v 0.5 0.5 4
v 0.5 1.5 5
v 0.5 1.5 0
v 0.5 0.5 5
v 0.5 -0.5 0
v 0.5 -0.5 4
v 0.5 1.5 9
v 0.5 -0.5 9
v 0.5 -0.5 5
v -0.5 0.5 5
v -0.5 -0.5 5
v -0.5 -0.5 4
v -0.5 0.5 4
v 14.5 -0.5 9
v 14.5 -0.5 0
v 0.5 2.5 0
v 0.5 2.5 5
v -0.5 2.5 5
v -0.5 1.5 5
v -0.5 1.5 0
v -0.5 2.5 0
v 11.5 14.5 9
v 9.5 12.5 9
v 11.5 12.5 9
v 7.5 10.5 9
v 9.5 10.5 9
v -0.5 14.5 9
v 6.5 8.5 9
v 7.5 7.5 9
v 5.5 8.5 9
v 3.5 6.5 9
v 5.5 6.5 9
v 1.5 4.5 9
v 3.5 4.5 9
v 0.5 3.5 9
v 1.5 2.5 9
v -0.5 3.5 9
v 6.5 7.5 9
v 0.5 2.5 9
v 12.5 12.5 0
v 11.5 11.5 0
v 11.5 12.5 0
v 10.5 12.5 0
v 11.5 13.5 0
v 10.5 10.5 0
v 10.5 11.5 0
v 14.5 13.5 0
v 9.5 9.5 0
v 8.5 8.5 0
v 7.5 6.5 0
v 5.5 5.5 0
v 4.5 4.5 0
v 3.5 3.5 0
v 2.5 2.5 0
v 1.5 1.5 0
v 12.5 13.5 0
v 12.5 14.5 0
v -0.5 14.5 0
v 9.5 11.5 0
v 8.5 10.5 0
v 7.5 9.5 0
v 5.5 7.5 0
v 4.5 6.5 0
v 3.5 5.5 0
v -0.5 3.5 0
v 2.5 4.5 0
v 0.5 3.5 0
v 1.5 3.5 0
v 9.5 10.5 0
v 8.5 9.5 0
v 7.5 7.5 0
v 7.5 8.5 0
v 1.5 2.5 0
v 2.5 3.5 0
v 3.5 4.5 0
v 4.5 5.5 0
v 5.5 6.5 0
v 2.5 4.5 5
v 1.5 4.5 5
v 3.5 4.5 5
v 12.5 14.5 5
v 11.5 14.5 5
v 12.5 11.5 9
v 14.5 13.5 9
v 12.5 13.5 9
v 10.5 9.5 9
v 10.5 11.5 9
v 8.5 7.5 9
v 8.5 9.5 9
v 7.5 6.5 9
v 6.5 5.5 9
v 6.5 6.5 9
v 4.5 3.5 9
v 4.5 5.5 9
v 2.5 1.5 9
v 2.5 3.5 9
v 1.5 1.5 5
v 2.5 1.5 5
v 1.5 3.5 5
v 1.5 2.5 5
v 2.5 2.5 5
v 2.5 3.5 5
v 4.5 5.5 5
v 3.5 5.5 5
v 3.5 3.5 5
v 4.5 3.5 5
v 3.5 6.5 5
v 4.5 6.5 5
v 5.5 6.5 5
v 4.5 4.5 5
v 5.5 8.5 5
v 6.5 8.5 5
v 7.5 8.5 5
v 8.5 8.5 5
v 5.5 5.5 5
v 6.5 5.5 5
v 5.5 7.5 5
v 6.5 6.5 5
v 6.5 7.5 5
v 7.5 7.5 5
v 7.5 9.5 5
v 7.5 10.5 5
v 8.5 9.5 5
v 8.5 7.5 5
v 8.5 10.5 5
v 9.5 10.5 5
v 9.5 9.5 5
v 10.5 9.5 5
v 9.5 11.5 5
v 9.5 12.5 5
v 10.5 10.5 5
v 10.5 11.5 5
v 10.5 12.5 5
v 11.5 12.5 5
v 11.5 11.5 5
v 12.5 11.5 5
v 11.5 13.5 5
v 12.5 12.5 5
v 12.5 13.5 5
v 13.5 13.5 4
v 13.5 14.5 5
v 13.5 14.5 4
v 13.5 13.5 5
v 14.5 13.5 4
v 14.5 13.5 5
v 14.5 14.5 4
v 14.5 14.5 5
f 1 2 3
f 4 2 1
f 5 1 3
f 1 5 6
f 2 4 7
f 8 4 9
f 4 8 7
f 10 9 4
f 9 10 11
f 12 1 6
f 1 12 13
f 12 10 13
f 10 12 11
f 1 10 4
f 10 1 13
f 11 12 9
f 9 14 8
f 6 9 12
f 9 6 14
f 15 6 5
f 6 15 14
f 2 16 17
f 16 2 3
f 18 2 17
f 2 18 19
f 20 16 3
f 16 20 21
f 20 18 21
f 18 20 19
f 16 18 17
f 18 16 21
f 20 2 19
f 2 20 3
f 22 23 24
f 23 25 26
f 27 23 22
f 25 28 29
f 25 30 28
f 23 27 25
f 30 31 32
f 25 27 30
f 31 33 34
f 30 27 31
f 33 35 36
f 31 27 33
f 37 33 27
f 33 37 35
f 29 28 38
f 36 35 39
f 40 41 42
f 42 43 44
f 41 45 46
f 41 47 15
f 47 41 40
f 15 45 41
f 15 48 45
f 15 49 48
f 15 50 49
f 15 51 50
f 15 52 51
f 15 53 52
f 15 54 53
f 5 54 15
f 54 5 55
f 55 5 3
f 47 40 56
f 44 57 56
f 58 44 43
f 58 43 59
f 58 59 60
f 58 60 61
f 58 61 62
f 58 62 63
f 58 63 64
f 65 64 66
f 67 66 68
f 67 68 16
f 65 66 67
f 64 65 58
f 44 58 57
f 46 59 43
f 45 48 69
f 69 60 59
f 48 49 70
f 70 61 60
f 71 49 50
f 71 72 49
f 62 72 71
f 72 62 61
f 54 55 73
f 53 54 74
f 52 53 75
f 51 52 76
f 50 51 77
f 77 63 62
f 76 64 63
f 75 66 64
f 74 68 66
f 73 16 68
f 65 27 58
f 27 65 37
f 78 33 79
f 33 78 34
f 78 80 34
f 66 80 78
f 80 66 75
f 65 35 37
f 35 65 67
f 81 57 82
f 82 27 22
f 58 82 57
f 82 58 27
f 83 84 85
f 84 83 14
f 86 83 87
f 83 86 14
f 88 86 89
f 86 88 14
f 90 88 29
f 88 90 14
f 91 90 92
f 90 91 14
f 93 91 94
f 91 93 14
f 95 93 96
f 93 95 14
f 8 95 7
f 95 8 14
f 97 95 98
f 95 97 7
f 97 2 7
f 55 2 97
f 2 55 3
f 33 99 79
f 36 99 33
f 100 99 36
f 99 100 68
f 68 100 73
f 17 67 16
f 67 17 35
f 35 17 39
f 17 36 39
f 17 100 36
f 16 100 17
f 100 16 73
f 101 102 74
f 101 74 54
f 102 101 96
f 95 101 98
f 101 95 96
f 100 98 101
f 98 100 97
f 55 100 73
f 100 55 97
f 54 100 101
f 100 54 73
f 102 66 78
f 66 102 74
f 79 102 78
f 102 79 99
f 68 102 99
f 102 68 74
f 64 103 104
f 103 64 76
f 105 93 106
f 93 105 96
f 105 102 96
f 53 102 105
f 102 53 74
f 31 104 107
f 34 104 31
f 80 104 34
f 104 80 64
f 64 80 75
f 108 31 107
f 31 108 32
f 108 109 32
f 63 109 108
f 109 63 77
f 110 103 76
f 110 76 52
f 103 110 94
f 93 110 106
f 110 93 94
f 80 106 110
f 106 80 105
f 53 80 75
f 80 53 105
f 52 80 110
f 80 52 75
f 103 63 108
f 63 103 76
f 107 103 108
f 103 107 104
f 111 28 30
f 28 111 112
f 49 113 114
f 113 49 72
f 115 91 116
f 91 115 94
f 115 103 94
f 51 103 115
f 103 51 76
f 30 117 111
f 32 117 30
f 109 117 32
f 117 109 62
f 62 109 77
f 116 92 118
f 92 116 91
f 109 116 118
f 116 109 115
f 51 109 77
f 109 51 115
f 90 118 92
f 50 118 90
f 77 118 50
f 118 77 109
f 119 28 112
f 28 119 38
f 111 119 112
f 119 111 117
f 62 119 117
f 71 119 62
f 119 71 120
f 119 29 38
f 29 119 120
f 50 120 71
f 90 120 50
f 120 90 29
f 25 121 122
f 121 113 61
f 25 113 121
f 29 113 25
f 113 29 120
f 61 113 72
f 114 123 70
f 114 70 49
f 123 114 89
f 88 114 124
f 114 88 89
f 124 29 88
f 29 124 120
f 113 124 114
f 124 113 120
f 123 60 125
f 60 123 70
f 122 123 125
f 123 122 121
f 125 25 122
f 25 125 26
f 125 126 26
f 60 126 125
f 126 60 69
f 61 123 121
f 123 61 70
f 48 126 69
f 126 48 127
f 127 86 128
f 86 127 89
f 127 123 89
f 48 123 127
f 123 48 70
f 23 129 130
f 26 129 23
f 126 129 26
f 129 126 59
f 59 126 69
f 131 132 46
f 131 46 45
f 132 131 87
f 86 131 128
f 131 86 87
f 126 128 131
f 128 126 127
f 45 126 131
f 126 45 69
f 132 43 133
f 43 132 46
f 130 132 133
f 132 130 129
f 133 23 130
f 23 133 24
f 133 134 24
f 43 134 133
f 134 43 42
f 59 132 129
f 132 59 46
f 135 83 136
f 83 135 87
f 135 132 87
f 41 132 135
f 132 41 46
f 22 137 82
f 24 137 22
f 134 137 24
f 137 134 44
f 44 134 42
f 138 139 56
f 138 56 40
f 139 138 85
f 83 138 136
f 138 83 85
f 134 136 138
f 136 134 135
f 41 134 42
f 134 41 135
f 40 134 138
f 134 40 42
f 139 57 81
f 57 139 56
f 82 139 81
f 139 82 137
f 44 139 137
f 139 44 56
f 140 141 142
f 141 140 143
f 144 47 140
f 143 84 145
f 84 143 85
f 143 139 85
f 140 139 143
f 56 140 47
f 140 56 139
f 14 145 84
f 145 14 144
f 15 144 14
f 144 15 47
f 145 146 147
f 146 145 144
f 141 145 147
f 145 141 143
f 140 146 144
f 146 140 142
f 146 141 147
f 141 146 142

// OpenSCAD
union() {
    translate([0, 0, 4.5]) color([1, 0, 0]) cube([1, 1, 1], center=true);
    translate([0, 2, 2.5]) cube([1, 1, 5], center=true);
    translate([0, 4, 4.5]) cube([1, 1, 9], center=true);
    translate([0, 5, 4.5]) cube([1, 1, 9], center=true);
    translate([0, 6, 4.5]) cube([1, 1, 9], center=true);
    translate([0, 7, 4.5]) cube([1, 1, 9], center=true);
    translate([0, 8, 4.5]) cube([1, 1, 9], center=true);
    translate([0, 9, 4.5]) cube([1, 1, 9], center=true);
    translate([0, 10, 4.5]) cube([1, 1, 9], center=true);
    translate([0, 11, 4.5]) cube([1, 1, 9], center=true);
    translate([0, 12, 4.5]) cube([1, 1, 9], center=true);
    translate([0, 13, 4.5]) cube([1, 1, 9], center=true);
    translate([0, 14, 4.5]) cube([1, 1, 9], center=true);
    translate([1, 0, 4.5]) cube([1, 1, 9], center=true);
    translate([1, 1, 4.5]) cube([1, 1, 9], center=true);
    translate([1, 3, 4.5]) cube([1, 1, 9], center=true);
    translate([1, 4, 4.5]) cube([1, 1, 9], center=true);
    translate([1, 5, 4.5]) cube([1, 1, 9], center=true);
    translate([1, 6, 4.5]) cube([1, 1, 9], center=true);
    translate([1, 7, 4.5]) cube([1, 1, 9], center=true);
    translate([1, 8, 4.5]) cube([1, 1, 9], center=true);
    translate([1, 9, 4.5]) cube([1, 1, 9], center=true);
    translate([1, 10, 4.5]) cube([1, 1, 9], center=true);
    translate([1, 11, 4.5]) cube([1, 1, 9], center=true);
    translate([1, 12, 4.5]) cube([1, 1, 9], center=true);
    translate([1, 13, 4.5]) cube([1, 1, 9], center=true);
    translate([1, 14, 4.5]) cube([1, 1, 9], center=true);
    translate([2, 0, 4.5]) cube([1, 1, 9], center=true);
    translate([2, 1, 4.5]) cube([1, 1, 9], center=true);
    translate([2, 2, 2.5]) cube([1, 1, 5], center=true);
    translate([2, 4, 2.5]) cube([1, 1, 5], center=true);
    translate([2, 5, 4.5]) cube([1, 1, 9], center=true);
    translate([2, 6, 4.5]) cube([1, 1, 9], center=true);
    translate([2, 7, 4.5]) cube([1, 1, 9], center=true);
    translate([2, 8, 4.5]) cube([1, 1, 9], center=true);
    translate([2, 9, 4.5]) cube([1, 1, 9], center=true);
    translate([2, 10, 4.5]) cube([1, 1, 9], center=true);
    translate([2, 11, 4.5]) cube([1, 1, 9], center=true);
    translate([2, 12, 4.5]) cube([1, 1, 9], center=true);
    translate([2, 13, 4.5]) cube([1, 1, 9], center=true);
    translate([2, 14, 4.5]) cube([1, 1, 9], center=true);
    translate([3, 0, 4.5]) cube([1, 1, 9], center=true);
    translate([3, 1, 4.5]) cube([1, 1, 9], center=true);
    translate([3, 2, 4.5]) cube([1, 1, 9], center=true);
    translate([3, 3, 4.5]) cube([1, 1, 9], center=true);
    translate([3, 5, 4.5]) cube([1, 1, 9], center=true);
    translate([3, 6, 4.5]) cube([1, 1, 9], center=true);
    translate([3, 7, 4.5]) cube([1, 1, 9], center=true);
    translate([3, 8, 4.5]) cube([1, 1, 9], center=true);
    translate([3, 9, 4.5]) cube([1, 1, 9], center=true);
    translate([3, 10, 4.5]) cube([1, 1, 9], center=true);
    translate([3, 11, 4.5]) cube([1, 1, 9], center=true);
    translate([3, 12, 4.5]) cube([1, 1, 9], center=true);
    translate([3, 13, 4.5]) cube([1, 1, 9], center=true);
    translate([3, 14, 4.5]) cube([1, 1, 9], center=true);
    translate([4, 0, 4.5]) cube([1, 1, 9], center=true);
    translate([4, 1, 4.5]) cube([1, 1, 9], center=true);
    translate([4, 2, 4.5]) cube([1, 1, 9], center=true);
    translate([4, 3, 4.5]) cube([1, 1, 9], center=true);
    translate([4, 4, 2.5]) cube([1, 1, 5], center=true);
    translate([4, 6, 2.5]) cube([1, 1, 5], center=true);
    translate([4, 7, 4.5]) cube([1, 1, 9], center=true);
    translate([4, 8, 4.5]) cube([1, 1, 9], center=true);
    translate([4, 9, 4.5]) cube([1, 1, 9], center=true);
    translate([4, 10, 4.5]) cube([1, 1, 9], center=true);
    translate([4, 11, 4.5]) cube([1, 1, 9], center=true);
    translate([4, 12, 4.5]) cube([1, 1, 9], center=true);
    translate([4, 13, 4.5]) cube([1, 1, 9], center=true);
    translate([4, 14, 4.5]) cube([1, 1, 9], center=true);
    translate([5, 0, 4.5]) cube([1, 1, 9], center=true);
    translate([5, 1, 4.5]) cube([1, 1, 9], center=true);
    translate([5, 2, 4.5]) cube([1, 1, 9], center=true);
    translate([5, 3, 4.5]) cube([1, 1, 9], center=true);
    translate([5, 4, 4.5]) cube([1, 1, 9], center=true);
    translate([5, 5, 4.5]) cube([1, 1, 9], center=true);
    translate([5, 7, 4.5]) cube([1, 1, 9], center=true);
    translate([5, 8, 4.5]) cube([1, 1, 9], center=true);
    translate([5, 9, 4.5]) cube([1, 1, 9], center=true);
    translate([5, 10, 4.5]) cube([1, 1, 9], center=true);
    translate([5, 11, 4.5]) cube([1, 1, 9], center=true);
    translate([5, 12, 4.5]) cube([1, 1, 9], center=true);
    translate([5, 13, 4.5]) cube([1, 1, 9], center=true);
    translate([5, 14, 4.5]) cube([1, 1, 9], center=true);
    translate([6, 0, 4.5]) cube([1, 1, 9], center=true);
    translate([6, 1, 4.5]) cube([1, 1, 9], center=true);
    translate([6, 2, 4.5]) cube([1, 1, 9], center=true);
    translate([6, 3, 4.5]) cube([1, 1, 9], center=true);
    translate([6, 4, 4.5]) cube([1, 1, 9], center=true);
    translate([6, 5, 4.5]) cube([1, 1, 9], center=true);
    translate([6, 6, 2.5]) cube([1, 1, 5], center=true);
    translate([6, 8, 2.5]) cube([1, 1, 5], center=true);
    translate([6, 9, 4.5]) cube([1, 1, 9], center=true);
    translate([6, 10, 4.5]) cube([1, 1, 9], center=true);
    translate([6, 11, 4.5]) cube([1, 1, 9], center=true);
    translate([6, 12, 4.5]) cube([1, 1, 9], center=true);
    translate([6, 13, 4.5]) cube([1, 1, 9], center=true);
    translate([6, 14, 4.5]) cube([1, 1, 9], center=true);
    translate([7, 0, 4.5]) cube([1, 1, 9], center=true);
    translate([7, 1, 4.5]) cube([1, 1, 9], center=true);
    translate([7, 2, 4.5]) cube([1, 1, 9], center=true);
    translate([7, 3, 4.5]) cube([1, 1, 9], center=true);
    translate([7, 4, 4.5]) cube([1, 1, 9], center=true);
    translate([7, 5, 4.5]) cube([1, 1, 9], center=true);
    translate([7, 6, 4.5]) cube([1, 1, 9], center=true);
    translate([7, 8, 4.5]) cube([1, 1, 9], center=true);
    translate([7, 9, 4.5]) cube([1, 1, 9], center=true);
    translate([7, 10, 4.5]) cube([1, 1, 9], center=true);
    translate([7, 11, 4.5]) cube([1, 1, 9], center=true);
    translate([7, 12, 4.5]) cube([1, 1, 9], center=true);
    translate([7, 13, 4.5]) cube([1, 1, 9], center=true);
    translate([7, 14, 4.5]) cube([1, 1, 9], center=true);
    translate([8, 0, 4.5]) cube([1, 1, 9], center=true);
    translate([8, 1, 4.5]) cube([1, 1, 9], center=true);
    translate([8, 2, 4.5]) cube([1, 1, 9], center=true);
    translate([8, 3, 4.5]) cube([1, 1, 9], center=true);
    translate([8, 4, 4.5]) cube([1, 1, 9], center=true);
    translate([8, 5, 4.5]) cube([1, 1, 9], center=true);
    translate([8, 6, 4.5]) cube([1, 1, 9], center=true);
    translate([8, 7, 4.5]) cube([1, 1, 9], center=true);
    translate([8, 8, 2.5]) cube([1, 1, 5], center=true);
    translate([8, 10, 2.5]) cube([1, 1, 5], center=true);
    translate([8, 11, 4.5]) cube([1, 1, 9], center=true);
    translate([8, 12, 4.5]) cube([1, 1, 9], center=true);
    translate([8, 13, 4.5]) cube([1, 1, 9], center=true);
    translate([8, 14, 4.5]) cube([1, 1, 9], center=true);
    translate([9, 0, 4.5]) cube([1, 1, 9], center=true);
    translate([9, 1, 4.5]) cube([1, 1, 9], center=true);
    translate([9, 2, 4.5]) cube([1, 1, 9], center=true);
    translate([9, 3, 4.5]) cube([1, 1, 9], center=true);
    translate([9, 4, 4.5]) cube([1, 1, 9], center=true);
    translate([9, 5, 4.5]) cube([1, 1, 9], center=true);
    translate([9, 6, 4.5]) cube([1, 1, 9], center=true);
    translate([9, 7, 4.5]) cube([1, 1, 9], center=true);
    translate([9, 8, 4.5]) cube([1, 1, 9], center=true);
    translate([9, 9, 4.5]) cube([1, 1, 9], center=true);
    translate([9, 11, 4.5]) cube([1, 1, 9], center=true);
    translate([9, 12, 4.5]) cube([1, 1, 9], center=true);
    translate([9, 13, 4.5]) cube([1, 1, 9], center=true);
    translate([9, 14, 4.5]) cube([1, 1, 9], center=true);
    translate([10, 0, 4.5]) cube([1, 1, 9], center=true);
    translate([10, 1, 4.5]) cube([1, 1, 9], center=true);
    translate([10, 2, 4.5]) cube([1, 1, 9], center=true);
    translate([10, 3, 4.5]) cube([1, 1, 9], center=true);
    translate([10, 4, 4.5]) cube([1, 1, 9], center=true);
    translate([10, 5, 4.5]) cube([1, 1, 9], center=true);
    translate([10, 6, 4.5]) cube([1, 1, 9], center=true);
    translate([10, 7, 4.5]) cube([1, 1, 9], center=true);
    translate([10, 8, 4.5]) cube([1, 1, 9], center=true);
    translate([10, 9, 4.5]) cube([1, 1, 9], center=true);
    translate([10, 10, 2.5]) cube([1, 1, 5], center=true);
    translate([10, 12, 2.5]) cube([1, 1, 5], center=true);
    translate([10, 13, 4.5]) cube([1, 1, 9], center=true);
    translate([10, 14, 4.5]) cube([1, 1, 9], center=true);
    translate([11, 0, 4.5]) cube([1, 1, 9], center=true);
    translate([11, 1, 4.5]) cube([1, 1, 9], center=true);
    translate([11, 2, 4.5]) cube([1, 1, 9], center=true);
    translate([11, 3, 4.5]) cube([1, 1, 9], center=true);
    translate([11, 4, 4.5]) cube([1, 1, 9], center=true);
    translate([11, 5, 4.5]) cube([1, 1, 9], center=true);
    translate([11, 6, 4.5]) cube([1, 1, 9], center=true);
    translate([11, 7, 4.5]) cube([1, 1, 9], center=true);
    translate([11, 8, 4.5]) cube([1, 1, 9], center=true);
    translate([11, 9, 4.5]) cube([1, 1, 9], center=true);
    translate([11, 10, 4.5]) cube([1, 1, 9], center=true);
    translate([11, 11, 4.5]) cube([1, 1, 9], center=true);
    translate([11, 13, 4.5]) cube([1, 1, 9], center=true);
    translate([11, 14, 4.5]) cube([1, 1, 9], center=true);
    translate([12, 0, 4.5]) cube([1, 1, 9], center=true);
    translate([12, 1, 4.5]) cube([1, 1, 9], center=true);
    translate([12, 2, 4.5]) cube([1, 1, 9], center=true);
    translate([12, 3, 4.5]) cube([1, 1, 9], center=true);
    translate([12, 4, 4.5]) cube([1, 1, 9], center=true);
    translate([12, 5, 4.5]) cube([1, 1, 9], center=true);
    translate([12, 6, 4.5]) cube([1, 1, 9], center=true);
    translate([12, 7, 4.5]) cube([1, 1, 9], center=true);
    translate([12, 8, 4.5]) cube([1, 1, 9], center=true);
    translate([12, 9, 4.5]) cube([1, 1, 9], center=true);
    translate([12, 10, 4.5]) cube([1, 1, 9], center=true);
    translate([12, 11, 4.5]) cube([1, 1, 9], center=true);
    translate([12, 12, 2.5]) cube([1, 1, 5], center=true);
    translate([12, 14, 2.5]) cube([1, 1, 5], center=true);
    translate([13, 0, 4.5]) cube([1, 1, 9], center=true);
    translate([13, 1, 4.5]) cube([1, 1, 9], center=true);
    translate([13, 2, 4.5]) cube([1, 1, 9], center=true);
    translate([13, 3, 4.5]) cube([1, 1, 9], center=true);
    translate([13, 4, 4.5]) cube([1, 1, 9], center=true);
    translate([13, 5, 4.5]) cube([1, 1, 9], center=true);
    translate([13, 6, 4.5]) cube([1, 1, 9], center=true);
    translate([13, 7, 4.5]) cube([1, 1, 9], center=true);
    translate([13, 8, 4.5]) cube([1, 1, 9], center=true);
    translate([13, 9, 4.5]) cube([1, 1, 9], center=true);
    translate([13, 10, 4.5]) cube([1, 1, 9], center=true);
    translate([13, 11, 4.5]) cube([1, 1, 9], center=true);
    translate([13, 12, 4.5]) cube([1, 1, 9], center=true);
    translate([13, 13, 4.5]) cube([1, 1, 9], center=true);
    translate([14, 0, 4.5]) cube([1, 1, 9], center=true);
    translate([14, 1, 4.5]) cube([1, 1, 9], center=true);
    translate([14, 2, 4.5]) cube([1, 1, 9], center=true);
    translate([14, 3, 4.5]) cube([1, 1, 9], center=true);
    translate([14, 4, 4.5]) cube([1, 1, 9], center=true);
    translate([14, 5, 4.5]) cube([1, 1, 9], center=true);
    translate([14, 6, 4.5]) cube([1, 1, 9], center=true);
    translate([14, 7, 4.5]) cube([1, 1, 9], center=true);
    translate([14, 8, 4.5]) cube([1, 1, 9], center=true);
    translate([14, 9, 4.5]) cube([1, 1, 9], center=true);
    translate([14, 10, 4.5]) cube([1, 1, 9], center=true);
    translate([14, 11, 4.5]) cube([1, 1, 9], center=true);
    translate([14, 12, 4.5]) cube([1, 1, 9], center=true);
    translate([14, 13, 4.5]) cube([1, 1, 9], center=true);
    translate([14, 14, 4.5]) color([0, 0, 1]) cube([1, 1, 1], center=true);
}
